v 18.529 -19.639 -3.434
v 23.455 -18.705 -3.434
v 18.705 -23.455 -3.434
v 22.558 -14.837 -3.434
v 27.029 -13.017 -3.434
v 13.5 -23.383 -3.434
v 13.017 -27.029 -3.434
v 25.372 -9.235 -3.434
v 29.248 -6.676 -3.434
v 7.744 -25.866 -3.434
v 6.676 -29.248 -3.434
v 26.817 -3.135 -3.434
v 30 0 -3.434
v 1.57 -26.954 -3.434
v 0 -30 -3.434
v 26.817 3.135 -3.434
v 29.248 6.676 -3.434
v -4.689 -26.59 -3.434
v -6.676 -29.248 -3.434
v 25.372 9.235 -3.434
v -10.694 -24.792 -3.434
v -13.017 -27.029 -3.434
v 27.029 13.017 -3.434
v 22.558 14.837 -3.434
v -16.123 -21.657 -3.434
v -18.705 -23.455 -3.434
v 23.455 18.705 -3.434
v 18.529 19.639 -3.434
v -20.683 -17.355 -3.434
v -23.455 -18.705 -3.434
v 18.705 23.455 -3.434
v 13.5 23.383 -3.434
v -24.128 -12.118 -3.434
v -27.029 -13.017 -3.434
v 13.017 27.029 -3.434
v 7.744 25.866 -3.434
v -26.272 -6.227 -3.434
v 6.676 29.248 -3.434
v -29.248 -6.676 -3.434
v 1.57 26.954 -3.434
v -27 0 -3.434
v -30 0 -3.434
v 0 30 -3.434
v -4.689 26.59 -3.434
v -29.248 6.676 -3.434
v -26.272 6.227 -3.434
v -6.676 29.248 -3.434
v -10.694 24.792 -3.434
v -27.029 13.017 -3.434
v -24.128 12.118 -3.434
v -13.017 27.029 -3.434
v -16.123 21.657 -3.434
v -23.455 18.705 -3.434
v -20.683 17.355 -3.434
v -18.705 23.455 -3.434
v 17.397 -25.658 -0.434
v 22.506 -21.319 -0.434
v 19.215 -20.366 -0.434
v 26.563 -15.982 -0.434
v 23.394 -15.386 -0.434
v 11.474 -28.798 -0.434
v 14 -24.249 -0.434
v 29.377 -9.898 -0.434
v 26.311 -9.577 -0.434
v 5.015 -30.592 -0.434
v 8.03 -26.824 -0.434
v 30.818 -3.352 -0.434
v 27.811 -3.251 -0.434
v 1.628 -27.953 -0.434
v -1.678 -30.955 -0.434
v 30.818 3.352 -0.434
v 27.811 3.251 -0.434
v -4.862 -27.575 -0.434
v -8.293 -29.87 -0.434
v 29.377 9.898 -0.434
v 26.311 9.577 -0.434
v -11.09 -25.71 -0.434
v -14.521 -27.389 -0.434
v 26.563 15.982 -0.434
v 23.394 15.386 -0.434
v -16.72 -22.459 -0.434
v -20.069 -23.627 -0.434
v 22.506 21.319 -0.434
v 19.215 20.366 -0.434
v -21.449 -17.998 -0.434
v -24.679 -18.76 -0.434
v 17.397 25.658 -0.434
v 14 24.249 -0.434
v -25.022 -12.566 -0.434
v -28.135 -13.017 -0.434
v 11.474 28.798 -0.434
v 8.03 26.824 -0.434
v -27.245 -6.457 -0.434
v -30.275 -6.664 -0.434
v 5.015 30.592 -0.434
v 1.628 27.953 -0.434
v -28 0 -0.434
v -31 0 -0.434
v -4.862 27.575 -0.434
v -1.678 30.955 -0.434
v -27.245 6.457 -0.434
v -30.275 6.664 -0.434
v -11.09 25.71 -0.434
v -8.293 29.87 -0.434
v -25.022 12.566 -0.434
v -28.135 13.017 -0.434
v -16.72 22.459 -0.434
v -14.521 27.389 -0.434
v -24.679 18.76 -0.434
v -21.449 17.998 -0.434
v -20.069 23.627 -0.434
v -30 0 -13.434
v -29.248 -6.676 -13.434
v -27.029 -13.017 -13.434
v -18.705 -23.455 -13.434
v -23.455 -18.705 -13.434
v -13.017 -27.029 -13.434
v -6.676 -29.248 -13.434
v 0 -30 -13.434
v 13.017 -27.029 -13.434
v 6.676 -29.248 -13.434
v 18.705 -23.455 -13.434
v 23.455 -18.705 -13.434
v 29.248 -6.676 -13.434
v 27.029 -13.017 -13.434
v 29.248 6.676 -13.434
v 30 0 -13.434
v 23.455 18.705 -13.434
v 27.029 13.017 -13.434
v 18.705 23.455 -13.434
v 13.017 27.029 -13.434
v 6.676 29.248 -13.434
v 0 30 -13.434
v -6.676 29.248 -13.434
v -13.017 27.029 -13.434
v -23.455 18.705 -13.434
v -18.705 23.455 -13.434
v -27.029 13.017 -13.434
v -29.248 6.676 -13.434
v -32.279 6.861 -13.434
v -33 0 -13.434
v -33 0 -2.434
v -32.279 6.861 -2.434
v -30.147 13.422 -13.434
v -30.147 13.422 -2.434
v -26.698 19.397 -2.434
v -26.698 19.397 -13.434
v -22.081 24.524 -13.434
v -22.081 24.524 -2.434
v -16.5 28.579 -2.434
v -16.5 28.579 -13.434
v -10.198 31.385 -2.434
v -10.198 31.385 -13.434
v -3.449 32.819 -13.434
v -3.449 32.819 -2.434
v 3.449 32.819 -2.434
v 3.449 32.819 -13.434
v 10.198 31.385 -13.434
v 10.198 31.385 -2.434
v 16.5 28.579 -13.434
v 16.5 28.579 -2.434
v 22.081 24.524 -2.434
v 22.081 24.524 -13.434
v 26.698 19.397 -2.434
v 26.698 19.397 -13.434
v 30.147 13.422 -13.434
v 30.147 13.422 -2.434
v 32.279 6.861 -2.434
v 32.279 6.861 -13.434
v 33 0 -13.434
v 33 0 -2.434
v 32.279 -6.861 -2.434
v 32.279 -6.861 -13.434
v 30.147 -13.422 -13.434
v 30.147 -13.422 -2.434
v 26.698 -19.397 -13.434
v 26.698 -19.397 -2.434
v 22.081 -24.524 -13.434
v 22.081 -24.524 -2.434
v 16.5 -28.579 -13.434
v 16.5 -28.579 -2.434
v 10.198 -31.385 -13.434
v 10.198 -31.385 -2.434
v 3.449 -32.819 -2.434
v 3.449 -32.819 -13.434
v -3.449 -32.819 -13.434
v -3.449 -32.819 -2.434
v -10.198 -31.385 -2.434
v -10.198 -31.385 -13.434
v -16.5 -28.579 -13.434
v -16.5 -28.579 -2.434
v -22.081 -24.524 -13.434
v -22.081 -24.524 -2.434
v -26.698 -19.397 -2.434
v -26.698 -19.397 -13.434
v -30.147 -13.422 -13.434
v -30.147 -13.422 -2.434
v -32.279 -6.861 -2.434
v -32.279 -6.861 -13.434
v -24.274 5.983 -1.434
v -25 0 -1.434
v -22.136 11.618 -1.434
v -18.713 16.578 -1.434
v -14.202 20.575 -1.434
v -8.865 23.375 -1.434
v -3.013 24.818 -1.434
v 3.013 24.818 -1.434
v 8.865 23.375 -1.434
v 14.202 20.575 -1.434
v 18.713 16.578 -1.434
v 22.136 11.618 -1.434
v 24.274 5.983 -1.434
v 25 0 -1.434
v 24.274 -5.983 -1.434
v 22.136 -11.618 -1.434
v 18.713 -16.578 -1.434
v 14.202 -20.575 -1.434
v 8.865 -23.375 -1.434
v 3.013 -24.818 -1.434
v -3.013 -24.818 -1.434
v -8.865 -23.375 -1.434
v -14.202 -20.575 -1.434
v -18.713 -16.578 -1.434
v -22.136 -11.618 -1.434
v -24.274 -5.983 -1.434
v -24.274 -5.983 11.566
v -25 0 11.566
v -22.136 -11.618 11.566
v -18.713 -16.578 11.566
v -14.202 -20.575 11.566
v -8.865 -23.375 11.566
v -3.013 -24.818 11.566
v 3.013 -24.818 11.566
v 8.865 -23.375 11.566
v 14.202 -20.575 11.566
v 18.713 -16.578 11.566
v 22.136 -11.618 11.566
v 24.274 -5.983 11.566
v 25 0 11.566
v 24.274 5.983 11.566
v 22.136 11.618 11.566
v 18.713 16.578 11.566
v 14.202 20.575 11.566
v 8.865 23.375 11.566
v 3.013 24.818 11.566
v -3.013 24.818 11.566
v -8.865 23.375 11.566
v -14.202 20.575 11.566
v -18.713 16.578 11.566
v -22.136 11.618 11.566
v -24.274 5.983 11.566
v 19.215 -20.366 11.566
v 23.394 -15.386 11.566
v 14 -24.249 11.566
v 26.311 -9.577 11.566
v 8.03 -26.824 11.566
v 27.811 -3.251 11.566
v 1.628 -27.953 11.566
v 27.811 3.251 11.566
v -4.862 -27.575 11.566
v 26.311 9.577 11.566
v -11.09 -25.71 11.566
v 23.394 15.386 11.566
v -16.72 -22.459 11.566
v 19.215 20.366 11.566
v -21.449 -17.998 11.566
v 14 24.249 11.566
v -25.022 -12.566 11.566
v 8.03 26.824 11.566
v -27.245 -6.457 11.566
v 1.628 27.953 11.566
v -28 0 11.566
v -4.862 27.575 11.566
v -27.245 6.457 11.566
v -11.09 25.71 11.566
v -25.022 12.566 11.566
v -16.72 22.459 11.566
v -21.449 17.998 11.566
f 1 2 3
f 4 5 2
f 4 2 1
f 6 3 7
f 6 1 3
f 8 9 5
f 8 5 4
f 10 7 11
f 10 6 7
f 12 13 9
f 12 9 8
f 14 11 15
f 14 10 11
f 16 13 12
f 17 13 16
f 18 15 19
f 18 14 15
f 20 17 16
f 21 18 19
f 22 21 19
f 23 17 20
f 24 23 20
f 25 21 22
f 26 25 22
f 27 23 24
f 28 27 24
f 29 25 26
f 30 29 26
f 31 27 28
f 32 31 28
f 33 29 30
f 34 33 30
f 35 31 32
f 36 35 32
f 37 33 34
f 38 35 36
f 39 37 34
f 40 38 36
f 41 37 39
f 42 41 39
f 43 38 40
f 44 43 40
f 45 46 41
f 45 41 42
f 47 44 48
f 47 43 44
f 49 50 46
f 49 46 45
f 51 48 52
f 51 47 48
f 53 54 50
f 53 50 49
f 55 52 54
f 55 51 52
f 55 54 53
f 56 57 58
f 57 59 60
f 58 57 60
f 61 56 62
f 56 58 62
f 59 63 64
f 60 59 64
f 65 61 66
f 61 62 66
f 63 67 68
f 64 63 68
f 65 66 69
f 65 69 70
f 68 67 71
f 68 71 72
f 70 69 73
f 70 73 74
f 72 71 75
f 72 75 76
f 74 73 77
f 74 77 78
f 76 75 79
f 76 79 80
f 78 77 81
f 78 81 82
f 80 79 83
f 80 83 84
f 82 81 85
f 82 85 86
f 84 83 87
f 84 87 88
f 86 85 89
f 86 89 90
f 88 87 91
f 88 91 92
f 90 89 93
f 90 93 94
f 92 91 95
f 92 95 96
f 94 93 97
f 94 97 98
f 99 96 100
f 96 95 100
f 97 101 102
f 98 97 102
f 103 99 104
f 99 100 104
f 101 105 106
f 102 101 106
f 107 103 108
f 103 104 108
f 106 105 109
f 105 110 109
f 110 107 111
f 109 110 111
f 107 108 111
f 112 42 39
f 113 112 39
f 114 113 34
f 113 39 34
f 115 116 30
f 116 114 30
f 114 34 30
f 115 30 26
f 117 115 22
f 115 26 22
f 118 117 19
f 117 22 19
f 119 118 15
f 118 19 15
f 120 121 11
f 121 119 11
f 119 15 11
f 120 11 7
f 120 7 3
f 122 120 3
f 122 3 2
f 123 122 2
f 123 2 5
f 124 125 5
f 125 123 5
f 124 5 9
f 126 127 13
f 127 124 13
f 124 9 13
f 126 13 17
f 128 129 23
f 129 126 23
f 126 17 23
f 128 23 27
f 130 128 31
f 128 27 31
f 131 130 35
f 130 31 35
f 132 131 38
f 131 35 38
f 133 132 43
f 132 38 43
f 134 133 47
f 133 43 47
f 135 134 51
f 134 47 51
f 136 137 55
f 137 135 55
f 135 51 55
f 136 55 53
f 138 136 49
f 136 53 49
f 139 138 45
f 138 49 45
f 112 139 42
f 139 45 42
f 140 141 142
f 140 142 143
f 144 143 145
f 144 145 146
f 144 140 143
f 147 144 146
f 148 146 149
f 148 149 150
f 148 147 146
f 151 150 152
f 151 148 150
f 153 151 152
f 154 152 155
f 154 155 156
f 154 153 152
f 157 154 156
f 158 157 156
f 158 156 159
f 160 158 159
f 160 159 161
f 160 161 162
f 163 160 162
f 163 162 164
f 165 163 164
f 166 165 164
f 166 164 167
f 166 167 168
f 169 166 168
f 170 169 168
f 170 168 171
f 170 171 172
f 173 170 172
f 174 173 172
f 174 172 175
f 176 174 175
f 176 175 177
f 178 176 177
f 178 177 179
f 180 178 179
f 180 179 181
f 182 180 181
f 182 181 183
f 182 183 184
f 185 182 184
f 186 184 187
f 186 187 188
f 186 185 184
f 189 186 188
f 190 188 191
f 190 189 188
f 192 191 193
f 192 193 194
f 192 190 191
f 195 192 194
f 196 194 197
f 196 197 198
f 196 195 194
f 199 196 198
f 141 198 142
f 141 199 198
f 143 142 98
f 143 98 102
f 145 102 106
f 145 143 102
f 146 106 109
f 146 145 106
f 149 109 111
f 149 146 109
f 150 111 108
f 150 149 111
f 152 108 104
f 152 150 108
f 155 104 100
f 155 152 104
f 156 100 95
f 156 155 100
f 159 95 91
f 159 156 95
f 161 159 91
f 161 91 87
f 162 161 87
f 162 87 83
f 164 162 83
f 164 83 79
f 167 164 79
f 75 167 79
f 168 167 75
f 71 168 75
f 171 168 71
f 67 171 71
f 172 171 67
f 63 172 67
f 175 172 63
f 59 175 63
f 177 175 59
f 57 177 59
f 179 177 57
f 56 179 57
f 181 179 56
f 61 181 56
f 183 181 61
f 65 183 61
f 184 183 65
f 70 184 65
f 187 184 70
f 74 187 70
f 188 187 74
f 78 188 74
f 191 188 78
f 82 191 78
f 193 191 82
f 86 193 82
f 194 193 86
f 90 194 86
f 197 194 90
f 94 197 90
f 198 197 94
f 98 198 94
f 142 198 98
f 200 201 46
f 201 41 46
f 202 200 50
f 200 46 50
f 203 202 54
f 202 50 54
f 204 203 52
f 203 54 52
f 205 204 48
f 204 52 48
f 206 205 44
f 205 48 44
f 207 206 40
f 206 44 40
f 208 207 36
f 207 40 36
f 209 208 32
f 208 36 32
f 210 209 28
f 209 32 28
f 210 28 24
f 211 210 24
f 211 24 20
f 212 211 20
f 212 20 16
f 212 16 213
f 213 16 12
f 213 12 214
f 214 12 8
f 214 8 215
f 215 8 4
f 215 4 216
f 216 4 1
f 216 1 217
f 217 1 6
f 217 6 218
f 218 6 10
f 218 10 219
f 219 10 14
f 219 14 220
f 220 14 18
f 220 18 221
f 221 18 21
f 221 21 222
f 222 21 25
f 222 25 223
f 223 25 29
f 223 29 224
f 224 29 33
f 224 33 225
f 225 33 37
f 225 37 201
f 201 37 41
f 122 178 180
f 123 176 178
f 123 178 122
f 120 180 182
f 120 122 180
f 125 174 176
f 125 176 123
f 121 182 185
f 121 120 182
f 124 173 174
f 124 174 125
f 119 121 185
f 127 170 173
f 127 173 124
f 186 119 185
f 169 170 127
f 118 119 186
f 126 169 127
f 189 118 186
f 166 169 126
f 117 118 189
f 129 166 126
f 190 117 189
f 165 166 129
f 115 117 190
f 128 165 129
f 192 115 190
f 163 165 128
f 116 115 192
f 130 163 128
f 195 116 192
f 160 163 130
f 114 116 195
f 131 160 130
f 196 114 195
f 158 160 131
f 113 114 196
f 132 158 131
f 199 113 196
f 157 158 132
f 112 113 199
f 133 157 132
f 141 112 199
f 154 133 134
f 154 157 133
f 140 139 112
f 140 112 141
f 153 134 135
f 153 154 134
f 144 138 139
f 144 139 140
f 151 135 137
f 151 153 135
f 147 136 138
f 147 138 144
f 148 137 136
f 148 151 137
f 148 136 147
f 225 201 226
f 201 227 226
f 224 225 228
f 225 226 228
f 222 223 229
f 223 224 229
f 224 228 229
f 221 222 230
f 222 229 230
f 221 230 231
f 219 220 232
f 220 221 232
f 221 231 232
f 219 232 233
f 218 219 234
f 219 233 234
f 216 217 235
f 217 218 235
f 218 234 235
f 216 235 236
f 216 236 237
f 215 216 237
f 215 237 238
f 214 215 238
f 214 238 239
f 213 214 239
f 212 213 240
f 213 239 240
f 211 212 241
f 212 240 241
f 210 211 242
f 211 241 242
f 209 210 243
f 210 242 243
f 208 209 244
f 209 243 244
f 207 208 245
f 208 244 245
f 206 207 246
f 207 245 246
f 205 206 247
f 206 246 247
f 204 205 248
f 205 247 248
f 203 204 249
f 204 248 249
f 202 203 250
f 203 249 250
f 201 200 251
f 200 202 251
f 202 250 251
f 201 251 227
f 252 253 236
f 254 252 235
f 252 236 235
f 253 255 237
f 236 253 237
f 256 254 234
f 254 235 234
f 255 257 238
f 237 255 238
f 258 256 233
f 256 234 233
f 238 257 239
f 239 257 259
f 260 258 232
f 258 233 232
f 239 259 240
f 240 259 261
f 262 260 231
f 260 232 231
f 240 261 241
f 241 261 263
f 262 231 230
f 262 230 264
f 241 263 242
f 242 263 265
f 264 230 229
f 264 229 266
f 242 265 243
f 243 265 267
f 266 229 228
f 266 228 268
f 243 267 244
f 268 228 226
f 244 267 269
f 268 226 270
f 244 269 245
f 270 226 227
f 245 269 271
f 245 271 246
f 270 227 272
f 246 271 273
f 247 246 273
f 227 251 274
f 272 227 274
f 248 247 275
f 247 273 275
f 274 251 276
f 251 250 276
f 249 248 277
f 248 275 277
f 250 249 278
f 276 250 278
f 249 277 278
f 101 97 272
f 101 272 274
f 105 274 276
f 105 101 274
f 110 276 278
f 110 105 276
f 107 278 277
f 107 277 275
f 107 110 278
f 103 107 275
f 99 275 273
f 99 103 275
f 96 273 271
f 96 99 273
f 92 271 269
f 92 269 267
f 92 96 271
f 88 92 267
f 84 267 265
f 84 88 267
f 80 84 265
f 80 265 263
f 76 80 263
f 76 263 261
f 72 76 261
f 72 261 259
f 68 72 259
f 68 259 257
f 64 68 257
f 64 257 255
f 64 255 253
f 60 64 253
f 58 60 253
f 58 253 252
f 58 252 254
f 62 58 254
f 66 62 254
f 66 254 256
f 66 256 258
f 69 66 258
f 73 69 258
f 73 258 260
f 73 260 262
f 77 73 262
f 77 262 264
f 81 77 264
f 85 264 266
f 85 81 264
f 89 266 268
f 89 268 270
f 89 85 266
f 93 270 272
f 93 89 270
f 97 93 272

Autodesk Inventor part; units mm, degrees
ref_plane "YZ Plane" through (0, 0, 0) normal (1, 0, 0) x (0, 1, 0)
ref_plane "XZ Plane" through (0, 0, 0) normal (0, 1, 0) x (-1, 0, 0)
ref_plane "XY Plane" through (0, 0, 0) normal (0, 0, 1) x (1, 0, 0)
sketch "Sketch1" plane through (0, 0, 0) normal (0, 1, 0) x (-1, 0, 0)
  line L0 (0, 26.3121) -> (0, -23.4342)
  line L1 (30, -13.4342) -> (30, -3.4342)
  line L2 (25, -1.4342) -> (25, 11.5658)
  line L3 (30, -3.4342) -> (27, -3.4342)
  line L4 (28, 11.5658) -> (28, -0.4342)
  line L5 (28, -0.4342) -> (31, -0.4342)
  line L6 (33, -2.4342) -> (33, -13.4342)
  line L7 (28, 11.5658) -> (25, 11.5658)
  line L8 (27, -3.4342) -> (25, -1.4342)
  line L9 (33, -2.4342) -> (31, -0.4342)
  line L10 (30, -3.4342) -> (30, -13.4342)
  line L11 (30, -13.4342) -> (33, -13.4342)
  point P0 (0, 0)
  point P1 (25, -3.4342)
  point P2 (33, -0.4342)
  dimension "d1" = 60
  dimension "d2" = 15
  dimension "d3" = 50
  dimension "d4" = 2
  dimension "d5" = 2
  dimension "d6" = 2
  dimension "d7" = 2
revolve "Revolution1" add sketch "Sketch1" angle 360 about axis through (0, 0, 26.3121) along (0, 0, -1)
equation "\"d5\" = d4"
equation "\"d7\" = d6"
properties part number "EXTRUSSOR-COUPLING"
